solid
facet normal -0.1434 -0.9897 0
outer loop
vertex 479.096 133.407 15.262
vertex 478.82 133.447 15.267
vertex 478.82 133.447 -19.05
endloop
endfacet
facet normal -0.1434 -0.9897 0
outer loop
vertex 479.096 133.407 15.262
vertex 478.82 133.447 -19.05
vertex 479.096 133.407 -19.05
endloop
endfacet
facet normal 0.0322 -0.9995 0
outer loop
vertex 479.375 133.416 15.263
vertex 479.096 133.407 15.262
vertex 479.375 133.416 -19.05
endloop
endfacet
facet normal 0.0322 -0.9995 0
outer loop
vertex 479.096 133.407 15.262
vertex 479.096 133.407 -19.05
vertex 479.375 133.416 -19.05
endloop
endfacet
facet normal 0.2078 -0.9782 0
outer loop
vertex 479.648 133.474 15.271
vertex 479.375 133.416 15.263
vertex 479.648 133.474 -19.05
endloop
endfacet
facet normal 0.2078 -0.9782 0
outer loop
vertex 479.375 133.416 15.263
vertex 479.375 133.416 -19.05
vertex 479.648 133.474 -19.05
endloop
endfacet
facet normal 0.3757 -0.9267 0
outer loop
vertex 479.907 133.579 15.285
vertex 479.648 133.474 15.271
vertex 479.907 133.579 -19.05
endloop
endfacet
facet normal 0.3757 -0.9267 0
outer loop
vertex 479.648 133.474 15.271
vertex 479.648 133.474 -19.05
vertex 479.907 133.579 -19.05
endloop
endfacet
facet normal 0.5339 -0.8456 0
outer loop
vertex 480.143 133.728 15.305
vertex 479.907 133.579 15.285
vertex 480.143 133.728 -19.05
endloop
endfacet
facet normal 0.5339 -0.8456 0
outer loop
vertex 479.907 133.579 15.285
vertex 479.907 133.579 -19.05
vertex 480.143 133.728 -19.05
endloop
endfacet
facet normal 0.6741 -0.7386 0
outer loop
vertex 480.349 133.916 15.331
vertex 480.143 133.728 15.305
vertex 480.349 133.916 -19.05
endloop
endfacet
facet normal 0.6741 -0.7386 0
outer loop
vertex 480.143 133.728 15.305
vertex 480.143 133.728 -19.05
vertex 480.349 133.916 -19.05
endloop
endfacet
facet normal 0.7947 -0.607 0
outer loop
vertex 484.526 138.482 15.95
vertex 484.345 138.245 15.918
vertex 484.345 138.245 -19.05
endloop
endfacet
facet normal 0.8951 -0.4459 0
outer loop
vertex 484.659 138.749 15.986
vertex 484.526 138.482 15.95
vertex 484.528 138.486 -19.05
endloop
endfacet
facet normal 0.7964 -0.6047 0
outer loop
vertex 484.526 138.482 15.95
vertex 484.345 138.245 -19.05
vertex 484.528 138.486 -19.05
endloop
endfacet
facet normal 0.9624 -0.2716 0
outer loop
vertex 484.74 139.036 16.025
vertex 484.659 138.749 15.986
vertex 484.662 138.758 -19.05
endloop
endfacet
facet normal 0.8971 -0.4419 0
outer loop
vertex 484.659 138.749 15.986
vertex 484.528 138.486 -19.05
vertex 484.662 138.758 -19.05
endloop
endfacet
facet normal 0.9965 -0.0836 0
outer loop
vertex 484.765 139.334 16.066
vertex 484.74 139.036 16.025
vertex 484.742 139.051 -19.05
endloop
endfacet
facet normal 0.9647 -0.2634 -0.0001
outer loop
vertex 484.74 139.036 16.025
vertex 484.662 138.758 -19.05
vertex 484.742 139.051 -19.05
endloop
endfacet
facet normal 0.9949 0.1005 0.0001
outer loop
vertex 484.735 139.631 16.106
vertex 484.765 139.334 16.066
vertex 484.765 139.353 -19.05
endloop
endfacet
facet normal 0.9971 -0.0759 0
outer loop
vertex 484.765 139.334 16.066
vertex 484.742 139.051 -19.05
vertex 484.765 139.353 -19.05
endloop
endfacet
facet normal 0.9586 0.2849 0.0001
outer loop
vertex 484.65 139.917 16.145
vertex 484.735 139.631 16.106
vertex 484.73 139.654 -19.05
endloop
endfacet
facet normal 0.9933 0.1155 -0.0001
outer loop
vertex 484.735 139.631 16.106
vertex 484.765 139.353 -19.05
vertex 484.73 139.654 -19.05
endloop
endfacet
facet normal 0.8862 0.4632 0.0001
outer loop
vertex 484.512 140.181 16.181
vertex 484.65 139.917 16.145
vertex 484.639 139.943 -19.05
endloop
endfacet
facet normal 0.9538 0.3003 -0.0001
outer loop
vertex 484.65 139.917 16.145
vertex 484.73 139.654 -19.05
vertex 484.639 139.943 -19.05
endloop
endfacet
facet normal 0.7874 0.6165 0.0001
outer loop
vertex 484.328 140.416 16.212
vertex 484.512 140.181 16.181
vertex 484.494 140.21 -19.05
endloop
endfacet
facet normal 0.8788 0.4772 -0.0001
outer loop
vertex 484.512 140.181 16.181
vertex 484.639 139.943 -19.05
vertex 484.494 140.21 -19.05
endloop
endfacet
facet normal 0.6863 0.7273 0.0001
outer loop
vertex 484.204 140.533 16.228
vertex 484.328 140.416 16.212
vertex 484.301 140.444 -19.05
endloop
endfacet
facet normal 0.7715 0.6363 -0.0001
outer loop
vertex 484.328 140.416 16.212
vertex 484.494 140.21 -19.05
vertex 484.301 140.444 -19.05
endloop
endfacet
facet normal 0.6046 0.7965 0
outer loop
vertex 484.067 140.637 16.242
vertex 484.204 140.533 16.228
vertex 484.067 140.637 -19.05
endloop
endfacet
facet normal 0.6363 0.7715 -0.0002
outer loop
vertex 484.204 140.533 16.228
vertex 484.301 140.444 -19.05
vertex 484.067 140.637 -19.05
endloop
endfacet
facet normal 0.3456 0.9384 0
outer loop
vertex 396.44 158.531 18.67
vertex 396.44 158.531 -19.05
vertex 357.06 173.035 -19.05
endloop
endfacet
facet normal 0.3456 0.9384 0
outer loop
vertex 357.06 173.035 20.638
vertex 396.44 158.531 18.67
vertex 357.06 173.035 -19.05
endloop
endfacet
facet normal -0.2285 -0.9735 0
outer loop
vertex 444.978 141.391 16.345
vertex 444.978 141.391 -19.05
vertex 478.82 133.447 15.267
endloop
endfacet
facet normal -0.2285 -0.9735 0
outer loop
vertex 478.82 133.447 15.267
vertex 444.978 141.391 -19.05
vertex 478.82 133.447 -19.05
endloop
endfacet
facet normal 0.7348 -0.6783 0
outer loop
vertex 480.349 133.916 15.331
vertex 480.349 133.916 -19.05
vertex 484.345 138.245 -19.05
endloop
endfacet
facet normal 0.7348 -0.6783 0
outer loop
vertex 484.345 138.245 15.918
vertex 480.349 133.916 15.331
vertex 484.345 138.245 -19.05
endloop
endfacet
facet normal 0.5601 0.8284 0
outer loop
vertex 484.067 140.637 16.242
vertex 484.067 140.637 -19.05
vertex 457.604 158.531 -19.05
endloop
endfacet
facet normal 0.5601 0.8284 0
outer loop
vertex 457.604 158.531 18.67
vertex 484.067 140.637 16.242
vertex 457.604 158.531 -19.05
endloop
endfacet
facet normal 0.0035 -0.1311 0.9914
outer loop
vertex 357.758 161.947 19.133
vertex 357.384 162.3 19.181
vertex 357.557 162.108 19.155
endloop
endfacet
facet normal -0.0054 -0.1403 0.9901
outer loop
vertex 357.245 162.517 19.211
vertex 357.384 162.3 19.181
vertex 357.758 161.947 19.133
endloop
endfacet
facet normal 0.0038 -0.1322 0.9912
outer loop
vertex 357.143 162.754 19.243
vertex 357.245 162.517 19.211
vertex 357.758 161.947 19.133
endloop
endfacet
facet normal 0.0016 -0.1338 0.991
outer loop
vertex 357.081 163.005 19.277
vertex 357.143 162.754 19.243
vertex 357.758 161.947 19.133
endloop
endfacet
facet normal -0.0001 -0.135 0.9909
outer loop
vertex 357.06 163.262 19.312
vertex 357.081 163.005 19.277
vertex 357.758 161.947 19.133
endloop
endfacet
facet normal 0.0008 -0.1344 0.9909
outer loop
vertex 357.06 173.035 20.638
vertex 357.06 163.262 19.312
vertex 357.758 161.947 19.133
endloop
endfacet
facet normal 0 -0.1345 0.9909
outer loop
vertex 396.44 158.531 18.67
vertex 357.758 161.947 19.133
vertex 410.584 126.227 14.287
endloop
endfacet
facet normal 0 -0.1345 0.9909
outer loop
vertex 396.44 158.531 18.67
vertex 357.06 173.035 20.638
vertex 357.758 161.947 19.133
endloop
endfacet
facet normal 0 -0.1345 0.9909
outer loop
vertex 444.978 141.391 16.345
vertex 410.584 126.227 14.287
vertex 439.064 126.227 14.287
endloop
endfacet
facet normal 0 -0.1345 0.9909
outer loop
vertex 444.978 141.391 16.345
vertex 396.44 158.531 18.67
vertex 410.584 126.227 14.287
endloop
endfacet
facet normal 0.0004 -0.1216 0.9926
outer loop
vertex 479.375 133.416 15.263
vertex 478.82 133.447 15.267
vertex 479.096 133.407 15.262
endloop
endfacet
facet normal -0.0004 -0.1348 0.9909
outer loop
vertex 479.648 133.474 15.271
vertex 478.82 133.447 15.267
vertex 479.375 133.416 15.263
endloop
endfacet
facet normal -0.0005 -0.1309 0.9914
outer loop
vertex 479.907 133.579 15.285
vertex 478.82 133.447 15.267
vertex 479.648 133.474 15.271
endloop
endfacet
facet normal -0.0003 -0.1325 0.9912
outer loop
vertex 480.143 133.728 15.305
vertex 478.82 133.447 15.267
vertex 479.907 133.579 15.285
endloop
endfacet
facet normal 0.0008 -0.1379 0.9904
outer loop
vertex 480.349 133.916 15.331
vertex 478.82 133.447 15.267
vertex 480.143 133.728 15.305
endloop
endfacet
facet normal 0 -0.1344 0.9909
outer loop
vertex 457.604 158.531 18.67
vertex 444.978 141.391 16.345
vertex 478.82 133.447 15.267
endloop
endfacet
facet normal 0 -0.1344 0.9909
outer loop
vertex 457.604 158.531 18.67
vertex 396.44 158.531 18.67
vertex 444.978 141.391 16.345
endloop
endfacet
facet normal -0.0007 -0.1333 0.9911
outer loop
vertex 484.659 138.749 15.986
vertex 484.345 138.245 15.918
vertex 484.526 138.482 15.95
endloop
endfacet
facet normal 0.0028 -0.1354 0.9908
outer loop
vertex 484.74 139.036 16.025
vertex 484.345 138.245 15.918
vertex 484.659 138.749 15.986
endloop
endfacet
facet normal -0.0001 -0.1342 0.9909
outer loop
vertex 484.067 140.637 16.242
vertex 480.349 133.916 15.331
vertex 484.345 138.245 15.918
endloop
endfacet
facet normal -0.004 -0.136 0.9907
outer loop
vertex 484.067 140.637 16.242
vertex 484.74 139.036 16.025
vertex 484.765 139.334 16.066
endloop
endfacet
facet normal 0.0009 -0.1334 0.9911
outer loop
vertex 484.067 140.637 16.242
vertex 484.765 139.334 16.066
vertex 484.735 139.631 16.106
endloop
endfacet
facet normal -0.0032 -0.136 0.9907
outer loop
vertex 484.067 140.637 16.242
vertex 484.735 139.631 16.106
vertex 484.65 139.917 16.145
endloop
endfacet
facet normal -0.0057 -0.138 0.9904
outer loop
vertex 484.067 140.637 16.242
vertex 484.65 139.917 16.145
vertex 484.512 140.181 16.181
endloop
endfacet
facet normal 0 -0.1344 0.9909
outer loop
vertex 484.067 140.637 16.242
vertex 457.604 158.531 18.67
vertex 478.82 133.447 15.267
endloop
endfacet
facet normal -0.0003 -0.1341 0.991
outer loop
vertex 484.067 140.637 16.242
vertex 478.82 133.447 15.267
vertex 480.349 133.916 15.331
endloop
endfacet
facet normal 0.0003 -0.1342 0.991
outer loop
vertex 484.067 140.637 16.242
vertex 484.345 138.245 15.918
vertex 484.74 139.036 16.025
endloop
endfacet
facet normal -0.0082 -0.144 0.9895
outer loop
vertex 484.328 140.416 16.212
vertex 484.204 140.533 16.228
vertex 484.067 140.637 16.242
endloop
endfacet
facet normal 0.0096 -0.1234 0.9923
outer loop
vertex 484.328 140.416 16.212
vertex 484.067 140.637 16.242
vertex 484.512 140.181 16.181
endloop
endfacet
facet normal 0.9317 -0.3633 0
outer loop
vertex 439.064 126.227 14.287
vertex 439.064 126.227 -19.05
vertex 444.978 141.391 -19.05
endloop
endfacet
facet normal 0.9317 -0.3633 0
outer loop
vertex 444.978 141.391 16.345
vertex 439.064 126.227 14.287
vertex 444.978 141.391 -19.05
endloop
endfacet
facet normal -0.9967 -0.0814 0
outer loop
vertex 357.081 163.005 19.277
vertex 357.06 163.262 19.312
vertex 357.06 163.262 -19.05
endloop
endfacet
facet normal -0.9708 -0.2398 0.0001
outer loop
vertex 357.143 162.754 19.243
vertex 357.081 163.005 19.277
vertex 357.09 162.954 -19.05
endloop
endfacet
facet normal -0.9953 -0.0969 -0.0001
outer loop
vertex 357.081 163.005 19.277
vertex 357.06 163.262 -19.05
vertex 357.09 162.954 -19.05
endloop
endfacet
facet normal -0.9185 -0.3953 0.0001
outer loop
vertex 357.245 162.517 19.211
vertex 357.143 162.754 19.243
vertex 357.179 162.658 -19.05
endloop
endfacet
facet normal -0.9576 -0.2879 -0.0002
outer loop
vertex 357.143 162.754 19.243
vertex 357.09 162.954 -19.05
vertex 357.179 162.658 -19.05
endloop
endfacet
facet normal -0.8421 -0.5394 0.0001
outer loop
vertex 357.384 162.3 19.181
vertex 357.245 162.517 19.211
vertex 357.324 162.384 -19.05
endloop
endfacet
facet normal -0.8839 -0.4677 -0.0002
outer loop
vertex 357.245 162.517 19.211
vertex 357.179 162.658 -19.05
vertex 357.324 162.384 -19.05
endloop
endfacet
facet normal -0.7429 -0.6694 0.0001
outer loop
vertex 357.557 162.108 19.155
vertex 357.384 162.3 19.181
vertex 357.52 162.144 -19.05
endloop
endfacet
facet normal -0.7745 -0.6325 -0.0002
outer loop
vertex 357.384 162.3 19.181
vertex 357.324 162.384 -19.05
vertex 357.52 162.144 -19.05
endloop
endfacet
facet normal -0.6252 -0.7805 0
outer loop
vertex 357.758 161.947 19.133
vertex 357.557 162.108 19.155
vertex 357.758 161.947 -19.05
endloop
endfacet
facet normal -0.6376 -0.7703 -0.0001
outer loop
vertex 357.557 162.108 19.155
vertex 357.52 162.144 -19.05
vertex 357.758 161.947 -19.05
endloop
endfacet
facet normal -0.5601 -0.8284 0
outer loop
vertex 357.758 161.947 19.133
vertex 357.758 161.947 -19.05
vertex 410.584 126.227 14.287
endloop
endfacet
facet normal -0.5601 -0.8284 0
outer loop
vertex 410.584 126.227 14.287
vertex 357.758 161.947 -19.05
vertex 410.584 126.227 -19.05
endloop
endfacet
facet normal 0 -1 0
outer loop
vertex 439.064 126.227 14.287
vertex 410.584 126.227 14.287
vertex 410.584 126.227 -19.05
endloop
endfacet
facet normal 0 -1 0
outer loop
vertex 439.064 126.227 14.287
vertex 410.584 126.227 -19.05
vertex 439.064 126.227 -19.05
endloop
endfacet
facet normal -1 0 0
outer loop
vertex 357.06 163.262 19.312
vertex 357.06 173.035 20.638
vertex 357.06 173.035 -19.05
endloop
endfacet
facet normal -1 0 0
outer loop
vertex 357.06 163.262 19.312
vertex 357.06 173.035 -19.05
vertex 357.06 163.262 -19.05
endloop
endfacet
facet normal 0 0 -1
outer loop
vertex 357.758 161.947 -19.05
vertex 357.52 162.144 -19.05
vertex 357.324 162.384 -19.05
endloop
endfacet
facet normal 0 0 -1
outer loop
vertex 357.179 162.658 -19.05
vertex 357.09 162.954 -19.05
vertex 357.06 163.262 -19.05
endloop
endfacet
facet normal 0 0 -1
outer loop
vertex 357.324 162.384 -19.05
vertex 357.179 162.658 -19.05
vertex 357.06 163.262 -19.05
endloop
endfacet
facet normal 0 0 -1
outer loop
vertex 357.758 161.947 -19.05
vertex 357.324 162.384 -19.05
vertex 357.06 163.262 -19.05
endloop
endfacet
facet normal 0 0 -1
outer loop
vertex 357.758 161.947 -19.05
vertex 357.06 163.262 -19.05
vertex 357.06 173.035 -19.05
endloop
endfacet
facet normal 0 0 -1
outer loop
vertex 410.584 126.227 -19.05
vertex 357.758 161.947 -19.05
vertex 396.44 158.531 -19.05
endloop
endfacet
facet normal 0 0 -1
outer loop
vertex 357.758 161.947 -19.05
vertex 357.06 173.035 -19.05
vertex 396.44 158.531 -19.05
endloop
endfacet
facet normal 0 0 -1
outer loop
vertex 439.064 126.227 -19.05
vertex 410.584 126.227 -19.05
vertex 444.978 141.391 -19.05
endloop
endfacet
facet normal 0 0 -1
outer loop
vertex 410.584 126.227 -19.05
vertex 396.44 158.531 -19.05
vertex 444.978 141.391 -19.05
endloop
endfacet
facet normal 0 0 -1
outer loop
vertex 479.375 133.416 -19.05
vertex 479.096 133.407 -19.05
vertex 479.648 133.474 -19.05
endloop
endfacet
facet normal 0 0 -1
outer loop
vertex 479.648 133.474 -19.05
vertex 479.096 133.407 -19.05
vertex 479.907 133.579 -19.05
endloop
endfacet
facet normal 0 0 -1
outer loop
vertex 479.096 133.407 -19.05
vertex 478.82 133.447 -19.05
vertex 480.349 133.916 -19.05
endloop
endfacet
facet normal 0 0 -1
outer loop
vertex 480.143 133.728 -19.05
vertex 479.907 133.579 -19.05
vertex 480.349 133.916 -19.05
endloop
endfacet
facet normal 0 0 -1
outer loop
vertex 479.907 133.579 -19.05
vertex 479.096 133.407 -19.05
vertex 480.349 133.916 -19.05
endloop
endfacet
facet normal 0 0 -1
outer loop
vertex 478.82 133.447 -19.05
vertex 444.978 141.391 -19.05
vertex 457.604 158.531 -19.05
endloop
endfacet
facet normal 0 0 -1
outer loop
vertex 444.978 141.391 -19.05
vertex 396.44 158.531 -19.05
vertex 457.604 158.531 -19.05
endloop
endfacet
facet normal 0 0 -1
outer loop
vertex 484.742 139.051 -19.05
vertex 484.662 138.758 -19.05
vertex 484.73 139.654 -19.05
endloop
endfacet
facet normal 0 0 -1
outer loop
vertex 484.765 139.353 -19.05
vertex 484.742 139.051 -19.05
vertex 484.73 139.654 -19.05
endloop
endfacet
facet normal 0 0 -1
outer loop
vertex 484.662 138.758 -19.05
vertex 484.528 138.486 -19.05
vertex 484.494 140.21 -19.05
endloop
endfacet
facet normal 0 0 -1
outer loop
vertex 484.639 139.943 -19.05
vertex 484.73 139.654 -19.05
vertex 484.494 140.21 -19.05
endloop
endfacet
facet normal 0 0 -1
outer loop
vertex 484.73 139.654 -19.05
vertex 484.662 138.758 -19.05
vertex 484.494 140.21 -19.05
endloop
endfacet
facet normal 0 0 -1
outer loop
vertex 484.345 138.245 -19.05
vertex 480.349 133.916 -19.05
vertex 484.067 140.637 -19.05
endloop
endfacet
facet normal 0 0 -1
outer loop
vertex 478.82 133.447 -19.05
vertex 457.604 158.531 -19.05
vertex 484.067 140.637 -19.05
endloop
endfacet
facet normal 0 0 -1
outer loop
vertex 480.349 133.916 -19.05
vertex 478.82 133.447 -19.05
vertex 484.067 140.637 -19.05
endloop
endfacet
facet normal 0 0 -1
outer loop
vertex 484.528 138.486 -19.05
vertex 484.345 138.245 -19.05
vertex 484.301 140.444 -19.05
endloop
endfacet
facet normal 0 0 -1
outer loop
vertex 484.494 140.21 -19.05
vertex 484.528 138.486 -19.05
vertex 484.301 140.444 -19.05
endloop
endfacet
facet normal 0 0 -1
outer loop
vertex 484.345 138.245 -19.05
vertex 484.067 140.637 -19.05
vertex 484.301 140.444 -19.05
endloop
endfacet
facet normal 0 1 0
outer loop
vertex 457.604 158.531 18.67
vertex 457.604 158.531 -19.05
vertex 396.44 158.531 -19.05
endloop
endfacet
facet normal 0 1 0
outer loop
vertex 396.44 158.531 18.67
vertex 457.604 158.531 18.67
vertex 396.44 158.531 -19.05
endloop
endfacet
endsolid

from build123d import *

# Parameters (mm, degrees)
BOSS_EXTRUDE1_DEPTH      = 20.6375
BOSS_EXTRUDE1_DEPTH_BACK = 19.05
SKETCH3_W                = 149.554059724
SKETCH3_H                = 74.48224525
CUT_EXTRUDE1_DEPTH       = 516.127884509


with BuildPart() as part:
    # Sketch1 → Boss-Extrude1 (new, two sides: drawn at the far end of the back side and taken through both)
    with BuildSketch(Plane.XY.offset(-BOSS_EXTRUDE1_DEPTH_BACK)):
        with BuildLine():
            Line((357.059535637, 173.035014711), (357.059535637, 163.261817954))
            ThreePointArc((357.059535637, 163.261817954), (357.244928479, 162.517337083), (357.75780558, 161.946741471))
            Line((357.75780558, 161.946741471), (410.584136752, 126.226566951))
            Line((410.584136752, 126.226566951), (439.063985597, 126.226566951))
            Line((439.063985597, 126.226566951), (444.978063494, 141.390869249))
            Line((444.978063494, 141.390869249), (478.819933038, 133.446768417))
            ThreePointArc((478.819933038, 133.446768417), (479.648013751, 133.474476416), (480.349350513, 133.915625085))
            Line((480.349350513, 133.915625085), (484.344651115, 138.244883468))
            ThreePointArc((484.344651115, 138.244883468), (484.754953748, 139.504412771), (484.067254744, 140.636593142))
            Line((484.067254744, 140.636593142), (457.603933076, 158.530595004))
            Line((457.603933076, 158.530595004), (396.440312316, 158.530595004))
            Line((396.440312316, 158.530595004), (357.059535637, 173.035014711))
        make_face()
    extrude(amount=BOSS_EXTRUDE1_DEPTH + BOSS_EXTRUDE1_DEPTH_BACK)

    # Sketch3 → Cut-Extrude1 (cut, through all)
    with BuildSketch(Plane(origin=(0, 0.377817836, -2.785049831), x_dir=(1, 0, 0), z_dir=(0, -0.13442794428844543, 0.9909233713029392))):
        with Locations((424.804234836, 142.512706275)):
            Rectangle(SKETCH3_W, SKETCH3_H)
    extrude(amount=CUT_EXTRUDE1_DEPTH, mode=Mode.SUBTRACT)


solid = part.part
